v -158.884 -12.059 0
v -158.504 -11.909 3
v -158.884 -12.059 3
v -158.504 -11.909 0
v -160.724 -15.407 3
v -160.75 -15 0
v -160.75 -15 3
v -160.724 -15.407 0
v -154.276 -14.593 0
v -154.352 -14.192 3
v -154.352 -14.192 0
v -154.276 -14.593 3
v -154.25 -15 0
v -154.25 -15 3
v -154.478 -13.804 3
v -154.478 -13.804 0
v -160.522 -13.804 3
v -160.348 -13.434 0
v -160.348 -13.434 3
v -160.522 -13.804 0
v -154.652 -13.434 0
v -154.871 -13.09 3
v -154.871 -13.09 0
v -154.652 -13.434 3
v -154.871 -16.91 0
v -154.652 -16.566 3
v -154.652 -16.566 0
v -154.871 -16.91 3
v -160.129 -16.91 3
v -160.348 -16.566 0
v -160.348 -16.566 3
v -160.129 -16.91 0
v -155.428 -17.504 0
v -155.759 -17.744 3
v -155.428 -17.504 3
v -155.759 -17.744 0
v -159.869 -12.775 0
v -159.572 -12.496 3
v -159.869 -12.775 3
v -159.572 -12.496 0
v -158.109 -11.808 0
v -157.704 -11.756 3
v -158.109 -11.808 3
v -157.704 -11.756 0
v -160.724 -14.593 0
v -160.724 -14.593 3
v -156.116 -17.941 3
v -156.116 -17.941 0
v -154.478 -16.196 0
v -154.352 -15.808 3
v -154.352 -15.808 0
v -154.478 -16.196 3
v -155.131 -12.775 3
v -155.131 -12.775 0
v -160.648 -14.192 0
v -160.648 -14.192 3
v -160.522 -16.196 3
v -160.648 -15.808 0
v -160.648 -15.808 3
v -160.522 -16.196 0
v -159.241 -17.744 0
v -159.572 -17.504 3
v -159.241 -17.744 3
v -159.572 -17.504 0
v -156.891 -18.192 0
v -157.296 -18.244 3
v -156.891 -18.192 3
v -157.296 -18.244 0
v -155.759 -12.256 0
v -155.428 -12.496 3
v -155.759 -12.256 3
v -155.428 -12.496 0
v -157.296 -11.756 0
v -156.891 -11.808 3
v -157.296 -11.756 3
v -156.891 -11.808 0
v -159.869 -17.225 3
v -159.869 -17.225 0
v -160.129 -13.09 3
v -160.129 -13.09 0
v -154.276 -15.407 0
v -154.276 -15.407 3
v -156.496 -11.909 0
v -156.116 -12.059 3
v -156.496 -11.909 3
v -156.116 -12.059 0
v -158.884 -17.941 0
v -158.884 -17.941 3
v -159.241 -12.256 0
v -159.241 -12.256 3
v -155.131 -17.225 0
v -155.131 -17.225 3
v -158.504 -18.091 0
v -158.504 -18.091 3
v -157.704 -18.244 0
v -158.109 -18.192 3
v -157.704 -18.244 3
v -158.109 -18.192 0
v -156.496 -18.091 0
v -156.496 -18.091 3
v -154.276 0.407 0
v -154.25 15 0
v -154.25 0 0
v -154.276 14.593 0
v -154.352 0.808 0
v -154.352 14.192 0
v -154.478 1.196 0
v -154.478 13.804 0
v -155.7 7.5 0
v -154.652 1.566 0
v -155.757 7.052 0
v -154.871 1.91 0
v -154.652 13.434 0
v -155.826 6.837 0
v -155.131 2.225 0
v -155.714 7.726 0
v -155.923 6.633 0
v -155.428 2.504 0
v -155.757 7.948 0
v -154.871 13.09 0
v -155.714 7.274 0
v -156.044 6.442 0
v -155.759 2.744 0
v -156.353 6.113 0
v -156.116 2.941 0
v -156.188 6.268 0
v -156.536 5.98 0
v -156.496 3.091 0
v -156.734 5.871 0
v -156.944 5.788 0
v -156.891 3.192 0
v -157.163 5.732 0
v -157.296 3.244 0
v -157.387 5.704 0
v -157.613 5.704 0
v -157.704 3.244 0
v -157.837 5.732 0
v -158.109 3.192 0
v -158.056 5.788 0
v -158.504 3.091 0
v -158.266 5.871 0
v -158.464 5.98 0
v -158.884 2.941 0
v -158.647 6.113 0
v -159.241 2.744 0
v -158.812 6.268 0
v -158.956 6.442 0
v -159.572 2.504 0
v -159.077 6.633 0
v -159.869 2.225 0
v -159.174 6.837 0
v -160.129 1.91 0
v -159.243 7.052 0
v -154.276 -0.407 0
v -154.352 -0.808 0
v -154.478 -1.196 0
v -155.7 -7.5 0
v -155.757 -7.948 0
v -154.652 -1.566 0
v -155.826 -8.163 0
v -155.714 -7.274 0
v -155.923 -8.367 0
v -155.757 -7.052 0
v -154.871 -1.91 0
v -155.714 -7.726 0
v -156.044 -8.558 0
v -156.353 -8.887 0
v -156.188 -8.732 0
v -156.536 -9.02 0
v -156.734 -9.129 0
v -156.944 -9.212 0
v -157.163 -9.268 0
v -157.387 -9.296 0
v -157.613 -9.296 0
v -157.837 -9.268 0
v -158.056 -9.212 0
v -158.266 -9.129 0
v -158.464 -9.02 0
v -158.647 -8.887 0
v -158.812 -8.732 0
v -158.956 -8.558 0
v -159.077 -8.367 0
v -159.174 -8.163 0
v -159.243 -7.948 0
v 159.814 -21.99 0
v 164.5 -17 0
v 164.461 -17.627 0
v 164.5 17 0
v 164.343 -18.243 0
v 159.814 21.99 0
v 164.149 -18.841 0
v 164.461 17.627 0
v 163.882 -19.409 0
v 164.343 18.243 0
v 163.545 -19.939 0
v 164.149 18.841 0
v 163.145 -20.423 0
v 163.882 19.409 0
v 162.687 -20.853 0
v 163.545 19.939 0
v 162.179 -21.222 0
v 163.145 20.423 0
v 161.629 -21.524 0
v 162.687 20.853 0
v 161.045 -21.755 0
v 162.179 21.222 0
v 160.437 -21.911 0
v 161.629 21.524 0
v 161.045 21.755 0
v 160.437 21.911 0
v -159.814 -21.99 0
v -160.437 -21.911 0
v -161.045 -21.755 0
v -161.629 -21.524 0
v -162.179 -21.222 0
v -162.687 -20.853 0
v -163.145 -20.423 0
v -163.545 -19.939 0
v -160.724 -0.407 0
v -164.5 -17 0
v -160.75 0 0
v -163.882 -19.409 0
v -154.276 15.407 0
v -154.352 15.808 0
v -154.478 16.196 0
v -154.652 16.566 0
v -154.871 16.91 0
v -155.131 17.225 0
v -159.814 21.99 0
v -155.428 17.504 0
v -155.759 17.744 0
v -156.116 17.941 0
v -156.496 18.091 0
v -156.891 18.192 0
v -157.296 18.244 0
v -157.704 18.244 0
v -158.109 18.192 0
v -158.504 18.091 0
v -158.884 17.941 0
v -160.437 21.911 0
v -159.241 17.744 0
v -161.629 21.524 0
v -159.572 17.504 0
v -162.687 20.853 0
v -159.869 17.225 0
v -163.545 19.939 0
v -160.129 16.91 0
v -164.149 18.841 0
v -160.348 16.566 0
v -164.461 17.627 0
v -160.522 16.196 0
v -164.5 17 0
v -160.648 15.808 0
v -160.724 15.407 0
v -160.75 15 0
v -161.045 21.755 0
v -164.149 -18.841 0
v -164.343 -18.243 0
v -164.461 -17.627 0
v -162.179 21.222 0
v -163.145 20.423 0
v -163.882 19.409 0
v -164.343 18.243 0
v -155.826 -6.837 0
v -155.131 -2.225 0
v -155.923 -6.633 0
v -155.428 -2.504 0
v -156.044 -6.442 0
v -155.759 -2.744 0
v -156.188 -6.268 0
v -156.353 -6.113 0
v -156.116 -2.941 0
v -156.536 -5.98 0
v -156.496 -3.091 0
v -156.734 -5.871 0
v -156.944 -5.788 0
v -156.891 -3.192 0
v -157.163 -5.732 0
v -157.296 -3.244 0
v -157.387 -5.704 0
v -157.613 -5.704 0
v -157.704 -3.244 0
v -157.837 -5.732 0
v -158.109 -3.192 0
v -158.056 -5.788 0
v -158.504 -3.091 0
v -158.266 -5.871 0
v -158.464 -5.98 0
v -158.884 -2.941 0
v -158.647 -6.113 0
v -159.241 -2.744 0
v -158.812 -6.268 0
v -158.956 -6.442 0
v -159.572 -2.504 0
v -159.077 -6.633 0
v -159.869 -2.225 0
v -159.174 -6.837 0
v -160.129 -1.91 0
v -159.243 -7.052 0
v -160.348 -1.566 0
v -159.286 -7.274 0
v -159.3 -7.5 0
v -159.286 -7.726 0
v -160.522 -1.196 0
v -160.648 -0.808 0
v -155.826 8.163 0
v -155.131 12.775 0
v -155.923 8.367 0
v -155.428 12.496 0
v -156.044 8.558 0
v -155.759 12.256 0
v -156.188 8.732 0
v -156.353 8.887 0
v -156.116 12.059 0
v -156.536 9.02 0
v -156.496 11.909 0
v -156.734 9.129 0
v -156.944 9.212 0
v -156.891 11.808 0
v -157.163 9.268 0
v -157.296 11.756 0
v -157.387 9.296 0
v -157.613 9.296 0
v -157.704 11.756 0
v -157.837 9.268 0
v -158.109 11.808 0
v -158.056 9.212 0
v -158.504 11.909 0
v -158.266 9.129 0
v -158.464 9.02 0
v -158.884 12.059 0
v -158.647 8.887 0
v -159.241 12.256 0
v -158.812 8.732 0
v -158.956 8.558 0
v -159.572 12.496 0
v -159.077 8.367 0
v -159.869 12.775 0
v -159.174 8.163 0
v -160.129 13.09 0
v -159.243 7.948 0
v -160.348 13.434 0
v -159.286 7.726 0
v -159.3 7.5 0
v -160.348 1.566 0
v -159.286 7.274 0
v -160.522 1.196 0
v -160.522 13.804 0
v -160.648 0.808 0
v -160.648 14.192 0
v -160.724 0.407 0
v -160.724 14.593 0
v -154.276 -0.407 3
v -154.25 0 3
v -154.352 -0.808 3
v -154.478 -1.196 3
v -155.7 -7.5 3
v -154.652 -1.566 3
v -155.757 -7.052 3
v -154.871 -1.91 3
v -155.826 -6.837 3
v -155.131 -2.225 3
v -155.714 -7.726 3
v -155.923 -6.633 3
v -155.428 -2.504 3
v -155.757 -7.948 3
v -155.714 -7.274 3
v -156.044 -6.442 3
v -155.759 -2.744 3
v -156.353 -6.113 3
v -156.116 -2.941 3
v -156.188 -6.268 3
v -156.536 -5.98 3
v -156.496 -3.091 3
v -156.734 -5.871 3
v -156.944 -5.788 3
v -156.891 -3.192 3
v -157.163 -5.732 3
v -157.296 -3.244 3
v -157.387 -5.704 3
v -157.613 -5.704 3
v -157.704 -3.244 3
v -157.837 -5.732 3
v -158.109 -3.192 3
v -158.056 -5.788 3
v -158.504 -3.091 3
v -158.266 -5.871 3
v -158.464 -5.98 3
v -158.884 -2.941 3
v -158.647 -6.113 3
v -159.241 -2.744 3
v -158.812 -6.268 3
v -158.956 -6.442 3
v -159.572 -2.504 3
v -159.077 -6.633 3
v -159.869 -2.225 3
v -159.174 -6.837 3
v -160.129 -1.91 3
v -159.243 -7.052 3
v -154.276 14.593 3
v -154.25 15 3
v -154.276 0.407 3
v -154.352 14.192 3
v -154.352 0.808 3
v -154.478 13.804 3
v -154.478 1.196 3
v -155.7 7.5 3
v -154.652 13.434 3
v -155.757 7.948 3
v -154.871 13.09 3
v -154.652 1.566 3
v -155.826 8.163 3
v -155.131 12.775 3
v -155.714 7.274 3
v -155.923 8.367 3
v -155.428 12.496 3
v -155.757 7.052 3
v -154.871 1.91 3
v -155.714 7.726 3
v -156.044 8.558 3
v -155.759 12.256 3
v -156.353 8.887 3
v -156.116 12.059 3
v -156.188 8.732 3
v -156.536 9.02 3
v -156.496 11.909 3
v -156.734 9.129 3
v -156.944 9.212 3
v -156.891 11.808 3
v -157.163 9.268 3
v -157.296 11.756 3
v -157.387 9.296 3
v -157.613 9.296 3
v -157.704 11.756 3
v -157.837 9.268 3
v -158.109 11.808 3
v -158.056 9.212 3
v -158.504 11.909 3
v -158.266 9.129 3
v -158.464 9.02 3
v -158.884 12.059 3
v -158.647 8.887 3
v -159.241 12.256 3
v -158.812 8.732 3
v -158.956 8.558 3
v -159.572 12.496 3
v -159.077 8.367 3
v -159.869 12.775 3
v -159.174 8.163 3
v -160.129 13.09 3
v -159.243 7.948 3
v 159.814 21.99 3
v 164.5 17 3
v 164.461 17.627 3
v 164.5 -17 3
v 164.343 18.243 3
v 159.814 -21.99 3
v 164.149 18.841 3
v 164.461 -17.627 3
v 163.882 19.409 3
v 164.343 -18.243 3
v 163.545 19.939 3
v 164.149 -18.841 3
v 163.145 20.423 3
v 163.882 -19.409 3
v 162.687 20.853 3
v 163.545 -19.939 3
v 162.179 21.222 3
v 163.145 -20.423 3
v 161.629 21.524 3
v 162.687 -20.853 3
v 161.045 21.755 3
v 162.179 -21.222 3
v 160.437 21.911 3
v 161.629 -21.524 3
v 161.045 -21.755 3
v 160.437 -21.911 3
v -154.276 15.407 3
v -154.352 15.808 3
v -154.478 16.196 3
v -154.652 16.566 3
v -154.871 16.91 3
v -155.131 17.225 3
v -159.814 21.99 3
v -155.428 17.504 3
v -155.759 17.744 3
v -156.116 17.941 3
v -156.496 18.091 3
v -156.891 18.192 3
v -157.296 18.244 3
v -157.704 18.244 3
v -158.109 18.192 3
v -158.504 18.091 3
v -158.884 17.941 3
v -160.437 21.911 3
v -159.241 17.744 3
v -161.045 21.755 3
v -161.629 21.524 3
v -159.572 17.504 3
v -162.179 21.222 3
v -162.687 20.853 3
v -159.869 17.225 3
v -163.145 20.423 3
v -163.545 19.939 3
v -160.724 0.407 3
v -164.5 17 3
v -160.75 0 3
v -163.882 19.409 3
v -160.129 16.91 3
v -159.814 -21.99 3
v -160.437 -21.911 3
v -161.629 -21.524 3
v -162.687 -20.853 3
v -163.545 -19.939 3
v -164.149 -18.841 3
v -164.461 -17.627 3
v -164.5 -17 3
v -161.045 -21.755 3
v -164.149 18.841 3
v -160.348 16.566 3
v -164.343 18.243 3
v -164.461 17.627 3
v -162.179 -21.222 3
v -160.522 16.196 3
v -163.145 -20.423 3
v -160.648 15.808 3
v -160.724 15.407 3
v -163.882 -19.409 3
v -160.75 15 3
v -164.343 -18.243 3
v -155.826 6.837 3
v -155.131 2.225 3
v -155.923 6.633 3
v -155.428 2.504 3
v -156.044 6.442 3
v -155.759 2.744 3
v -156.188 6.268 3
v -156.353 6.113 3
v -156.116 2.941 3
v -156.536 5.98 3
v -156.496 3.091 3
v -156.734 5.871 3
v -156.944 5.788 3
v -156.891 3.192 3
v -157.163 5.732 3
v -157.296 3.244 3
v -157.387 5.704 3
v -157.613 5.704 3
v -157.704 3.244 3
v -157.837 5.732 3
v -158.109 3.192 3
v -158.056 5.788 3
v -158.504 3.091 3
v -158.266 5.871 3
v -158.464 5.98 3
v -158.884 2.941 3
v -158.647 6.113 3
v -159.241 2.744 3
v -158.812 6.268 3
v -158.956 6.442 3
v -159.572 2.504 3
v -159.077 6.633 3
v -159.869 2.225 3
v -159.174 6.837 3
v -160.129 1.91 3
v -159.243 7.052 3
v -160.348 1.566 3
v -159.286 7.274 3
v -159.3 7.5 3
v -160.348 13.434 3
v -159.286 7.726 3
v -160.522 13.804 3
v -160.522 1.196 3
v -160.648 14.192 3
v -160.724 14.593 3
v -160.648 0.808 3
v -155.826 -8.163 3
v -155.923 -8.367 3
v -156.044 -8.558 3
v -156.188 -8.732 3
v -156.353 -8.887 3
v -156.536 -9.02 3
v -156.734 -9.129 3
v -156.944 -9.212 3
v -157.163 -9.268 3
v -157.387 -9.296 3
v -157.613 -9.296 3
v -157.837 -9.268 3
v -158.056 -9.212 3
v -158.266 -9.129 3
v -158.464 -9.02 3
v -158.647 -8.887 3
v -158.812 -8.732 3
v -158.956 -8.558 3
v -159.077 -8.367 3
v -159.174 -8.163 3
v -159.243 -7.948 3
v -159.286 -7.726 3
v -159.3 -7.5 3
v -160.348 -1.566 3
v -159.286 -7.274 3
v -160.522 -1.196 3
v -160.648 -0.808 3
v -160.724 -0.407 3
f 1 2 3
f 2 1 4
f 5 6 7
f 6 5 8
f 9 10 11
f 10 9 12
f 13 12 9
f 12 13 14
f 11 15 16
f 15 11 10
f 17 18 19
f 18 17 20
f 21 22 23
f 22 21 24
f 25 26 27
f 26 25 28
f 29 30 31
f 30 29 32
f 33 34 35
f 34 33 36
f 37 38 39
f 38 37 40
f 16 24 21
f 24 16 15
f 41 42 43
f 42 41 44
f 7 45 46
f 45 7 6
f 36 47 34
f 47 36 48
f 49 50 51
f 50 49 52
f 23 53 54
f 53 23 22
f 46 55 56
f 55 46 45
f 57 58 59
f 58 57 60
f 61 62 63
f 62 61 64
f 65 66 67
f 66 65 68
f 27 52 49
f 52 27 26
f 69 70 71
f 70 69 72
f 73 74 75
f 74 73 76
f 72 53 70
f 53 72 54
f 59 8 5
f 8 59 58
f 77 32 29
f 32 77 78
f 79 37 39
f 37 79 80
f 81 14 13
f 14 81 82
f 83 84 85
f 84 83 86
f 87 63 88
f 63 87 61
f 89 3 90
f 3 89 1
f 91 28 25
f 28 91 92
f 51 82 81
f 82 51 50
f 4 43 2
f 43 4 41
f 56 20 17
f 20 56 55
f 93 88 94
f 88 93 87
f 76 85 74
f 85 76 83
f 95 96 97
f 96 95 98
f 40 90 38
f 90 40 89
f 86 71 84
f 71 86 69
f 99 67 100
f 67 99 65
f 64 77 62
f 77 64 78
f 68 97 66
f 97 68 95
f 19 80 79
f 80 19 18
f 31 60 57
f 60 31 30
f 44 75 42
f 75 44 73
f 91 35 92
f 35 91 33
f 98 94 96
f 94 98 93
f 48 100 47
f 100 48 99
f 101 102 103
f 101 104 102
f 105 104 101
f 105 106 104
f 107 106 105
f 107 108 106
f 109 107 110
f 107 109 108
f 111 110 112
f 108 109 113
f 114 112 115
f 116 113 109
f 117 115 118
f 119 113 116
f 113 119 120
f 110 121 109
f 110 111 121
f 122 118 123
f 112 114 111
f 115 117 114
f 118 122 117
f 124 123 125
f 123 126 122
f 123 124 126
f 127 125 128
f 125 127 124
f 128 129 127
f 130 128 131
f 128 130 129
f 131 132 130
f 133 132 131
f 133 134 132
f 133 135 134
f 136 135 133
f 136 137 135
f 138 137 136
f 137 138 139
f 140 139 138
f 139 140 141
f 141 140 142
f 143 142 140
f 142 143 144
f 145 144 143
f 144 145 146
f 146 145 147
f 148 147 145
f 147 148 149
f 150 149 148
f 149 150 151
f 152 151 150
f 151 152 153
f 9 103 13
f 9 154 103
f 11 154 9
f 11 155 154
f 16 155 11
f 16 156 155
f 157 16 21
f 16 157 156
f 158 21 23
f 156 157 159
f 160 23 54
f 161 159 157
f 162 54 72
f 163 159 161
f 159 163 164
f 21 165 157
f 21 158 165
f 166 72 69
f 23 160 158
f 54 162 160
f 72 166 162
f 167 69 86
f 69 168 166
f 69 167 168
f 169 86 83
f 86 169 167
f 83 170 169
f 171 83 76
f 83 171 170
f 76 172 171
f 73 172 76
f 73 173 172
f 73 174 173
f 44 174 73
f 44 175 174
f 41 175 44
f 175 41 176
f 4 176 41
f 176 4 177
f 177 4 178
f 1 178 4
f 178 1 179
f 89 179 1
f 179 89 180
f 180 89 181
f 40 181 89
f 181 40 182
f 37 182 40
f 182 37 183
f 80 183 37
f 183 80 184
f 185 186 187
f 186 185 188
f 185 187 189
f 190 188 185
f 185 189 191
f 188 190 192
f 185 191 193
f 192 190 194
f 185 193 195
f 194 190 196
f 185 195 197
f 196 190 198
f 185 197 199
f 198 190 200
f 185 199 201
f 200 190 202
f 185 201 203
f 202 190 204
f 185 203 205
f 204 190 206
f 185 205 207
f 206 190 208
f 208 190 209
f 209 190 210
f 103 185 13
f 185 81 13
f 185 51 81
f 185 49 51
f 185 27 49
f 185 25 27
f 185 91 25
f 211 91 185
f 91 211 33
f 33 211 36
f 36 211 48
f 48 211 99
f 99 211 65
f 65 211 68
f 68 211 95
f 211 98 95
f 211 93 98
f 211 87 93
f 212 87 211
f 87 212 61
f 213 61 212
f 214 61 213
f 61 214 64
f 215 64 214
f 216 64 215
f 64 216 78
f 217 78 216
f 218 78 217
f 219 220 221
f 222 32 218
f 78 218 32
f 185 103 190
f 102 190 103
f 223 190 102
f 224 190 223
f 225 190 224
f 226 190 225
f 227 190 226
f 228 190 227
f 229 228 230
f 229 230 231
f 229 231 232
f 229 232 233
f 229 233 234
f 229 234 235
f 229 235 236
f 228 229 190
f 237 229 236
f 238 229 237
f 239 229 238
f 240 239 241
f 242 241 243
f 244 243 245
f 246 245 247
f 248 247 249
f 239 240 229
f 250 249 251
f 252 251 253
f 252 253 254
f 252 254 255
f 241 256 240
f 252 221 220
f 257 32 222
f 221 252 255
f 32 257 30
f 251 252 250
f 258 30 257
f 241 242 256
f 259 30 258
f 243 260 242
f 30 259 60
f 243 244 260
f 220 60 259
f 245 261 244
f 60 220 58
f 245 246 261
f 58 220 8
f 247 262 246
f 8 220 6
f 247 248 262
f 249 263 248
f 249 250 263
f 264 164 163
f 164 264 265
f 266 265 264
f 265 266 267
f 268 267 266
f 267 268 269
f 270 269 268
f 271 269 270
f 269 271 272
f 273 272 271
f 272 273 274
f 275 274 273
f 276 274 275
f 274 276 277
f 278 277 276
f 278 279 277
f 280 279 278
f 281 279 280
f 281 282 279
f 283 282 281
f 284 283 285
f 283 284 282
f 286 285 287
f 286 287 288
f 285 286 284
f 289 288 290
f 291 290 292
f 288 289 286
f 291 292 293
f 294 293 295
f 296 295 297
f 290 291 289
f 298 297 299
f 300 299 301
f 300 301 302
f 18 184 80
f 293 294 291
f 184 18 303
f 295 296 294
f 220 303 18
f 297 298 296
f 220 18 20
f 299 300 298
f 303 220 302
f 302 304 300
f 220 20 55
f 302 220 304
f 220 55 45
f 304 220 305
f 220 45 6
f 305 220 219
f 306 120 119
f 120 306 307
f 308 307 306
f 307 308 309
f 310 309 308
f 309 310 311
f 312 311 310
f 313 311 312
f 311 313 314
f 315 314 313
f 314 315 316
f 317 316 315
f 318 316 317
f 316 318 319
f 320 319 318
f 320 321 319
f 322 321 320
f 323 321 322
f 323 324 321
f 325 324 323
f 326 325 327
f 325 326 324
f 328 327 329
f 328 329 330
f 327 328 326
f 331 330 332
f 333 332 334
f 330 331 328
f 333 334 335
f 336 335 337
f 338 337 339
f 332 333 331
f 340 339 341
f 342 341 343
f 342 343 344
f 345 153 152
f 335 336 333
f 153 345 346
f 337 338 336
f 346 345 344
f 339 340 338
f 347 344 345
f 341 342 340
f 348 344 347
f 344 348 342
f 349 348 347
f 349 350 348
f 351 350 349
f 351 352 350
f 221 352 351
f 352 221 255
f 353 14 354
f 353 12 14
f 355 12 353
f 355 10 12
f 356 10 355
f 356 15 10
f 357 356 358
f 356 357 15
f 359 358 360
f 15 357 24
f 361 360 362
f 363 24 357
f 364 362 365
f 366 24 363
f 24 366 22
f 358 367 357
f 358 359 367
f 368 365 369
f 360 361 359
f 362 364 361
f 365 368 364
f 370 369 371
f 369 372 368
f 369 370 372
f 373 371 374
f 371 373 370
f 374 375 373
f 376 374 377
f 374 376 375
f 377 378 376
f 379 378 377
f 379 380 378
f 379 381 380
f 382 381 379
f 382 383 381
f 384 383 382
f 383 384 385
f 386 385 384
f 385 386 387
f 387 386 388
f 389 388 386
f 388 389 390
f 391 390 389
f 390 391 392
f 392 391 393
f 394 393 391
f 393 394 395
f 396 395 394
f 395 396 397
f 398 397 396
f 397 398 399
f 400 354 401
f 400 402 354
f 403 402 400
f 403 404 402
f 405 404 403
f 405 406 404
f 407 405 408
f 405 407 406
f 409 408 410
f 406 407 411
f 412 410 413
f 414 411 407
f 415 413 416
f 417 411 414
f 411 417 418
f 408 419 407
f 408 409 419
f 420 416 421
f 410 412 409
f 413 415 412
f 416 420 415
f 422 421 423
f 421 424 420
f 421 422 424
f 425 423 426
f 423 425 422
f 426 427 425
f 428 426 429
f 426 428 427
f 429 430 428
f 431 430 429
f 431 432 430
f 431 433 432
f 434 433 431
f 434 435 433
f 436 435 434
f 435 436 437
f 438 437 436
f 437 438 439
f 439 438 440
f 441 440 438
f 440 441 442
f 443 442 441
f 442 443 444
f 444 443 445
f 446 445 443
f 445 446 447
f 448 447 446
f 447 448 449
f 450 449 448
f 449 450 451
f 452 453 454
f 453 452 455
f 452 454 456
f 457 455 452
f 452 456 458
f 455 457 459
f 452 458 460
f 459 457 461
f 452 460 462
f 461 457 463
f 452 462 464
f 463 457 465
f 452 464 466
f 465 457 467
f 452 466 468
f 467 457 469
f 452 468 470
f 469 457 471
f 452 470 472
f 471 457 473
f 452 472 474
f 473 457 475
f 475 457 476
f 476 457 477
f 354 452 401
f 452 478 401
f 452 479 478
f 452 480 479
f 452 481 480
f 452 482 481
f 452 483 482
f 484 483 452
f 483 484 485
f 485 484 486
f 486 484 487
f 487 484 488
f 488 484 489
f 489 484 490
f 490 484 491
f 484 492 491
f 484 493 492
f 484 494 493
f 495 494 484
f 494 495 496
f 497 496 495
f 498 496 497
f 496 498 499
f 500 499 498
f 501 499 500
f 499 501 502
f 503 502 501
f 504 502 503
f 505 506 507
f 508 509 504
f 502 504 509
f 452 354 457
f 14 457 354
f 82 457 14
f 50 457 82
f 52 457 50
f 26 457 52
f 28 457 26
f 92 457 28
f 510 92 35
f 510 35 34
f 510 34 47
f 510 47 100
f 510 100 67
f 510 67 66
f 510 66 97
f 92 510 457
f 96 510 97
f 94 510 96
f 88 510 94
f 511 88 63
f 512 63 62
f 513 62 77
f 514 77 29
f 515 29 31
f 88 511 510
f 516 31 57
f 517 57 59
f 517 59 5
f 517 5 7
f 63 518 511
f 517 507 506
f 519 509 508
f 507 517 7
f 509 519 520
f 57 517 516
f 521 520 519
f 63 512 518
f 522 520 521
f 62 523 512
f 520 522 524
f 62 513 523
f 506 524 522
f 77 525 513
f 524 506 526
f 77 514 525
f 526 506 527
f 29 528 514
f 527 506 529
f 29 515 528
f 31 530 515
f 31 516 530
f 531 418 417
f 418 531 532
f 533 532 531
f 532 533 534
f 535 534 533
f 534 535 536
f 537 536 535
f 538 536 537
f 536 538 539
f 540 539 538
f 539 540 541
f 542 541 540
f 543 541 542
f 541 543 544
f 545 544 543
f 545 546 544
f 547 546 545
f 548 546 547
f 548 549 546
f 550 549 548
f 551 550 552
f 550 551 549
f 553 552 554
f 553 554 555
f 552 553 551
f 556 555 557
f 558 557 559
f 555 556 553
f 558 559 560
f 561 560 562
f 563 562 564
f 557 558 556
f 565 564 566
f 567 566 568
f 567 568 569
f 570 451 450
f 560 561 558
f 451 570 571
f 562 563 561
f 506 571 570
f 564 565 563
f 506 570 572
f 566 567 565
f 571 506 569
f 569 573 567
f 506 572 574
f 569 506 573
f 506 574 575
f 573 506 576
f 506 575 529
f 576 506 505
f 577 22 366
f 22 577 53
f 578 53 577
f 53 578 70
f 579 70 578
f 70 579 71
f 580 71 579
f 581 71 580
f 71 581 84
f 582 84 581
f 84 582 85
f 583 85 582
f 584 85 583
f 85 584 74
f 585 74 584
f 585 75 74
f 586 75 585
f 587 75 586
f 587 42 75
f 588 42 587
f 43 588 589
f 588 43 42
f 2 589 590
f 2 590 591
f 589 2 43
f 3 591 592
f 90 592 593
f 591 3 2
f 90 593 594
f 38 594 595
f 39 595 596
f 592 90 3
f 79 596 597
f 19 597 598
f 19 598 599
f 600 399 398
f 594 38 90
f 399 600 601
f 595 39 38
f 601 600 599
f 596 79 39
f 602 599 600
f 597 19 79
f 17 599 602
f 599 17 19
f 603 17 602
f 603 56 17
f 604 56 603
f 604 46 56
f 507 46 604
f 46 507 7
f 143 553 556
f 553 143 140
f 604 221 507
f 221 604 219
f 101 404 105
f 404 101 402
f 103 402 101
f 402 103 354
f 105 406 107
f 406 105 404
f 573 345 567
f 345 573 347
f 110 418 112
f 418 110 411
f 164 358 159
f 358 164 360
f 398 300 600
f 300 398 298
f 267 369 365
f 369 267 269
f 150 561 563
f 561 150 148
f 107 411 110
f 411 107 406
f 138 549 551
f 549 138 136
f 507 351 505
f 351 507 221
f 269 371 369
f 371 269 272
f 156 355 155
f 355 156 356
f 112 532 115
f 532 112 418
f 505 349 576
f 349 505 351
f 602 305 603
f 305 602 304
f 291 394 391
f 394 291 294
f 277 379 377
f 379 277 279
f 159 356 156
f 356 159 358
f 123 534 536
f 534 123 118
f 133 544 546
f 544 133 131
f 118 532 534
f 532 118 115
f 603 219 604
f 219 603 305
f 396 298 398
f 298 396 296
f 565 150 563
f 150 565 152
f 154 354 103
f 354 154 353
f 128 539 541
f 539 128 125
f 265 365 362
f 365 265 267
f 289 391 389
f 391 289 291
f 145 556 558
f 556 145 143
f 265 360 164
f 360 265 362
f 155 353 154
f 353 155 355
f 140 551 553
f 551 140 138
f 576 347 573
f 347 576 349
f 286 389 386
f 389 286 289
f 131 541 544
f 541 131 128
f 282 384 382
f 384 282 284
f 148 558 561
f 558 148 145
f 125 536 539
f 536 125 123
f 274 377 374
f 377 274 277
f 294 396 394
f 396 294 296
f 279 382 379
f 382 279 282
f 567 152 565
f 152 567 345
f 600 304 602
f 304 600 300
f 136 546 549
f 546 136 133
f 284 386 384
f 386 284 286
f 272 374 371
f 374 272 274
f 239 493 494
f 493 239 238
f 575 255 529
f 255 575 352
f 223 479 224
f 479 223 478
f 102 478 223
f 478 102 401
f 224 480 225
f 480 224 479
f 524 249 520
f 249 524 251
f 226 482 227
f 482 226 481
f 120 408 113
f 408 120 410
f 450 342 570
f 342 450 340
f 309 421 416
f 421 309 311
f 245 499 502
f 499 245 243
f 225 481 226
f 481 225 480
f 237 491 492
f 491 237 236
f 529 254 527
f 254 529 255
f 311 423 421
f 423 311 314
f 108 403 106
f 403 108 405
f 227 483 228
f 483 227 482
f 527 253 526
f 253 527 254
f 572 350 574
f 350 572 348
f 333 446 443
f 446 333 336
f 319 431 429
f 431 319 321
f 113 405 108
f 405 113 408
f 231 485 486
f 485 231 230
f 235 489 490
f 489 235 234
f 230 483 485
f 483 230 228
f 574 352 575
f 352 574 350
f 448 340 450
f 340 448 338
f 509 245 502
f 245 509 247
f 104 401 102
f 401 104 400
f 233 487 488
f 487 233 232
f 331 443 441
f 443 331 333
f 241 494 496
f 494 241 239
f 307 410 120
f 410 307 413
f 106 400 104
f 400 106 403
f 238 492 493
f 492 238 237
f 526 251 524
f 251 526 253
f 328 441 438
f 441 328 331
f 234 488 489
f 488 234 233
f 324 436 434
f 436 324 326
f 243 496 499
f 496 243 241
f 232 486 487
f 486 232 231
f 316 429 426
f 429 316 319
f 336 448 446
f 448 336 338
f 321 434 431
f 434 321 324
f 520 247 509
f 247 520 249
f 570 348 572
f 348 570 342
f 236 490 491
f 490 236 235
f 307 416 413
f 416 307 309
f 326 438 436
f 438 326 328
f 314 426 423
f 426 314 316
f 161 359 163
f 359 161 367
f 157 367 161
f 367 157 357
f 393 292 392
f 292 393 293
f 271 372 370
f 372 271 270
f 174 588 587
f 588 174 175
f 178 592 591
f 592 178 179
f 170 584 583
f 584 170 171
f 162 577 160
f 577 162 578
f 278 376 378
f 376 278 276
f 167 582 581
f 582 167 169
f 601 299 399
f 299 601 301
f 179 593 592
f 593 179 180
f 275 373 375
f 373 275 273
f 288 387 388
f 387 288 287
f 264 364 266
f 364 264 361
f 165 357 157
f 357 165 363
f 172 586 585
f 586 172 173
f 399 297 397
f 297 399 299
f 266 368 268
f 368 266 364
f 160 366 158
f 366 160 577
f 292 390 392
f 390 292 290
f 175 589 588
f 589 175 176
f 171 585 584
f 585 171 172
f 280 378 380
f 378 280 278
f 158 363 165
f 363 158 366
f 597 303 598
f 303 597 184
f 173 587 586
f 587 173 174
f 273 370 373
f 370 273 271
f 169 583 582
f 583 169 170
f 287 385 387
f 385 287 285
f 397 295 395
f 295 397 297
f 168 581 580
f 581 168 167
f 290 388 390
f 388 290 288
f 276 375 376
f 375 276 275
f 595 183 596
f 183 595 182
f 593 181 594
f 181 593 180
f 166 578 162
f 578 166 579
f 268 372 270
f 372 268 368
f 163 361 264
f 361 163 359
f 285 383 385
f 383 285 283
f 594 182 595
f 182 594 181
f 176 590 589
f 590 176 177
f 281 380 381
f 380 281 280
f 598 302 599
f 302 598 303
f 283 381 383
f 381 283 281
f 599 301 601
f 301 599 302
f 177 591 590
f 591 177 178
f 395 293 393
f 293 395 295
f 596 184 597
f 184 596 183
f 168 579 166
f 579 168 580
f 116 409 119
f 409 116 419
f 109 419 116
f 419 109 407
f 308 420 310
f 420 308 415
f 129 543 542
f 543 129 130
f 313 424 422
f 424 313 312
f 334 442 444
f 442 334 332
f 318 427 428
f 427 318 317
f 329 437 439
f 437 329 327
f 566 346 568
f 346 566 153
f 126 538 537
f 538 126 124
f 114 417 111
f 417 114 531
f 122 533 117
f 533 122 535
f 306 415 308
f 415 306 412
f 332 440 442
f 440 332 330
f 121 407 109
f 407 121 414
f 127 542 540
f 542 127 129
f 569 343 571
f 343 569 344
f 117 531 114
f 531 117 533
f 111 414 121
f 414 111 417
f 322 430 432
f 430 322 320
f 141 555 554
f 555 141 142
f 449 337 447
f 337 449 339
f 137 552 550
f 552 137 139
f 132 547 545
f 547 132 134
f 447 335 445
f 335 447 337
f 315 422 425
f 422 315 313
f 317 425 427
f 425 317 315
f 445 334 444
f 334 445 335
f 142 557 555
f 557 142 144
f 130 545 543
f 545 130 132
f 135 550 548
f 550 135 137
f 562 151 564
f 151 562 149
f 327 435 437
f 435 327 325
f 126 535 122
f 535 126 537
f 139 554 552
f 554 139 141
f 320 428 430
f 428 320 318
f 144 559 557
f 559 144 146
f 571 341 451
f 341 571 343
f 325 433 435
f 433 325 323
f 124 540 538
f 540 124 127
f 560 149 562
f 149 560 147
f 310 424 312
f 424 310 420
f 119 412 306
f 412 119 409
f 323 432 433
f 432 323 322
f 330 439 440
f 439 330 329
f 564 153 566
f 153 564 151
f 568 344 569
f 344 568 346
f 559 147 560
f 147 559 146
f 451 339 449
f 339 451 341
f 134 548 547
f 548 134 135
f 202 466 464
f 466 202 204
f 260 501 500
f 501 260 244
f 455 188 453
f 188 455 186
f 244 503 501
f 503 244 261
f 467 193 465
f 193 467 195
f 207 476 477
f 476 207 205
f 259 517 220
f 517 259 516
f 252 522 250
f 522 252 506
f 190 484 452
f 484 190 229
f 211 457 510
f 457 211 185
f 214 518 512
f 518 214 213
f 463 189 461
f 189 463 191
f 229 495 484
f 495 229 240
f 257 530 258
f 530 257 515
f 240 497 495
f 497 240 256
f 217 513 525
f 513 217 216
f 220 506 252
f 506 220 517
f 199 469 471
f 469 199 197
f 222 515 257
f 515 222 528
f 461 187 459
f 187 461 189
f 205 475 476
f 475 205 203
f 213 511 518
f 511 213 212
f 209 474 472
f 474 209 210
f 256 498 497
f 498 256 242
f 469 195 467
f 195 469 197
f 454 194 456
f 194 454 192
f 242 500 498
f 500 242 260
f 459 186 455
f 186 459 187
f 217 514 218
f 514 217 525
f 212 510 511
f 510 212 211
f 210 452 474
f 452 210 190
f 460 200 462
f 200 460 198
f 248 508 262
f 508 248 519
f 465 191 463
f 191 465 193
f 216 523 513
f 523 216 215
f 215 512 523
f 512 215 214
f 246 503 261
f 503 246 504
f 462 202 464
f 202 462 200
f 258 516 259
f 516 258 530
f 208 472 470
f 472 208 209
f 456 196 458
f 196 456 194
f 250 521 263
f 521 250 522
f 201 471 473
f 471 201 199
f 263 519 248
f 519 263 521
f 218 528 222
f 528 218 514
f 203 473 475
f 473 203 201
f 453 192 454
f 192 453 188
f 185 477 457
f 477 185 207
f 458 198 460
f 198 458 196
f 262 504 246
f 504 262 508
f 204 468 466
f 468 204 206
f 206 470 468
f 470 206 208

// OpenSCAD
$fn = 50;


difference() {
	union() {
		hull() {
			translate(v = [-159.5000000000, 17.0000000000, 0]) {
				cylinder(h = 3, r = 5);
			}
			translate(v = [159.5000000000, 17.0000000000, 0]) {
				cylinder(h = 3, r = 5);
			}
			translate(v = [-159.5000000000, -17.0000000000, 0]) {
				cylinder(h = 3, r = 5);
			}
			translate(v = [159.5000000000, -17.0000000000, 0]) {
				cylinder(h = 3, r = 5);
			}
		}
	}
	union() {
		translate(v = [-157.5000000000, -15.0000000000, 0]) {
			cylinder(h = 3, r = 3.2500000000);
		}
		translate(v = [-157.5000000000, 0.0000000000, 0]) {
			cylinder(h = 3, r = 3.2500000000);
		}
		translate(v = [-157.5000000000, 15.0000000000, 0]) {
			cylinder(h = 3, r = 3.2500000000);
		}
		translate(v = [-157.5000000000, -15.0000000000, 0]) {
			cylinder(h = 3, r = 1.8000000000);
		}
		translate(v = [-157.5000000000, -7.5000000000, 0]) {
			cylinder(h = 3, r = 1.8000000000);
		}
		translate(v = [-157.5000000000, 0.0000000000, 0]) {
			cylinder(h = 3, r = 1.8000000000);
		}
		translate(v = [-157.5000000000, 7.5000000000, 0]) {
			cylinder(h = 3, r = 1.8000000000);
		}
		translate(v = [-157.5000000000, 15.0000000000, 0]) {
			cylinder(h = 3, r = 1.8000000000);
		}
		translate(v = [-157.5000000000, -15.0000000000, 0]) {
			cylinder(h = 3, r = 1.8000000000);
		}
		translate(v = [-157.5000000000, -7.5000000000, 0]) {
			cylinder(h = 3, r = 1.8000000000);
		}
		translate(v = [-157.5000000000, 0.0000000000, 0]) {
			cylinder(h = 3, r = 1.8000000000);
		}
		translate(v = [-157.5000000000, 7.5000000000, 0]) {
			cylinder(h = 3, r = 1.8000000000);
		}
		translate(v = [-157.5000000000, 15.0000000000, 0]) {
			cylinder(h = 3, r = 1.8000000000);
		}
		translate(v = [-157.5000000000, -15.0000000000, 0]) {
			cylinder(h = 3, r = 1.8000000000);
		}
		translate(v = [-157.5000000000, -7.5000000000, 0]) {
			cylinder(h = 3, r = 1.8000000000);
		}
		translate(v = [-157.5000000000, 0.0000000000, 0]) {
			cylinder(h = 3, r = 1.8000000000);
		}
		translate(v = [-157.5000000000, 7.5000000000, 0]) {
			cylinder(h = 3, r = 1.8000000000);
		}
		translate(v = [-157.5000000000, 15.0000000000, 0]) {
			cylinder(h = 3, r = 1.8000000000);
		}
	}
}
